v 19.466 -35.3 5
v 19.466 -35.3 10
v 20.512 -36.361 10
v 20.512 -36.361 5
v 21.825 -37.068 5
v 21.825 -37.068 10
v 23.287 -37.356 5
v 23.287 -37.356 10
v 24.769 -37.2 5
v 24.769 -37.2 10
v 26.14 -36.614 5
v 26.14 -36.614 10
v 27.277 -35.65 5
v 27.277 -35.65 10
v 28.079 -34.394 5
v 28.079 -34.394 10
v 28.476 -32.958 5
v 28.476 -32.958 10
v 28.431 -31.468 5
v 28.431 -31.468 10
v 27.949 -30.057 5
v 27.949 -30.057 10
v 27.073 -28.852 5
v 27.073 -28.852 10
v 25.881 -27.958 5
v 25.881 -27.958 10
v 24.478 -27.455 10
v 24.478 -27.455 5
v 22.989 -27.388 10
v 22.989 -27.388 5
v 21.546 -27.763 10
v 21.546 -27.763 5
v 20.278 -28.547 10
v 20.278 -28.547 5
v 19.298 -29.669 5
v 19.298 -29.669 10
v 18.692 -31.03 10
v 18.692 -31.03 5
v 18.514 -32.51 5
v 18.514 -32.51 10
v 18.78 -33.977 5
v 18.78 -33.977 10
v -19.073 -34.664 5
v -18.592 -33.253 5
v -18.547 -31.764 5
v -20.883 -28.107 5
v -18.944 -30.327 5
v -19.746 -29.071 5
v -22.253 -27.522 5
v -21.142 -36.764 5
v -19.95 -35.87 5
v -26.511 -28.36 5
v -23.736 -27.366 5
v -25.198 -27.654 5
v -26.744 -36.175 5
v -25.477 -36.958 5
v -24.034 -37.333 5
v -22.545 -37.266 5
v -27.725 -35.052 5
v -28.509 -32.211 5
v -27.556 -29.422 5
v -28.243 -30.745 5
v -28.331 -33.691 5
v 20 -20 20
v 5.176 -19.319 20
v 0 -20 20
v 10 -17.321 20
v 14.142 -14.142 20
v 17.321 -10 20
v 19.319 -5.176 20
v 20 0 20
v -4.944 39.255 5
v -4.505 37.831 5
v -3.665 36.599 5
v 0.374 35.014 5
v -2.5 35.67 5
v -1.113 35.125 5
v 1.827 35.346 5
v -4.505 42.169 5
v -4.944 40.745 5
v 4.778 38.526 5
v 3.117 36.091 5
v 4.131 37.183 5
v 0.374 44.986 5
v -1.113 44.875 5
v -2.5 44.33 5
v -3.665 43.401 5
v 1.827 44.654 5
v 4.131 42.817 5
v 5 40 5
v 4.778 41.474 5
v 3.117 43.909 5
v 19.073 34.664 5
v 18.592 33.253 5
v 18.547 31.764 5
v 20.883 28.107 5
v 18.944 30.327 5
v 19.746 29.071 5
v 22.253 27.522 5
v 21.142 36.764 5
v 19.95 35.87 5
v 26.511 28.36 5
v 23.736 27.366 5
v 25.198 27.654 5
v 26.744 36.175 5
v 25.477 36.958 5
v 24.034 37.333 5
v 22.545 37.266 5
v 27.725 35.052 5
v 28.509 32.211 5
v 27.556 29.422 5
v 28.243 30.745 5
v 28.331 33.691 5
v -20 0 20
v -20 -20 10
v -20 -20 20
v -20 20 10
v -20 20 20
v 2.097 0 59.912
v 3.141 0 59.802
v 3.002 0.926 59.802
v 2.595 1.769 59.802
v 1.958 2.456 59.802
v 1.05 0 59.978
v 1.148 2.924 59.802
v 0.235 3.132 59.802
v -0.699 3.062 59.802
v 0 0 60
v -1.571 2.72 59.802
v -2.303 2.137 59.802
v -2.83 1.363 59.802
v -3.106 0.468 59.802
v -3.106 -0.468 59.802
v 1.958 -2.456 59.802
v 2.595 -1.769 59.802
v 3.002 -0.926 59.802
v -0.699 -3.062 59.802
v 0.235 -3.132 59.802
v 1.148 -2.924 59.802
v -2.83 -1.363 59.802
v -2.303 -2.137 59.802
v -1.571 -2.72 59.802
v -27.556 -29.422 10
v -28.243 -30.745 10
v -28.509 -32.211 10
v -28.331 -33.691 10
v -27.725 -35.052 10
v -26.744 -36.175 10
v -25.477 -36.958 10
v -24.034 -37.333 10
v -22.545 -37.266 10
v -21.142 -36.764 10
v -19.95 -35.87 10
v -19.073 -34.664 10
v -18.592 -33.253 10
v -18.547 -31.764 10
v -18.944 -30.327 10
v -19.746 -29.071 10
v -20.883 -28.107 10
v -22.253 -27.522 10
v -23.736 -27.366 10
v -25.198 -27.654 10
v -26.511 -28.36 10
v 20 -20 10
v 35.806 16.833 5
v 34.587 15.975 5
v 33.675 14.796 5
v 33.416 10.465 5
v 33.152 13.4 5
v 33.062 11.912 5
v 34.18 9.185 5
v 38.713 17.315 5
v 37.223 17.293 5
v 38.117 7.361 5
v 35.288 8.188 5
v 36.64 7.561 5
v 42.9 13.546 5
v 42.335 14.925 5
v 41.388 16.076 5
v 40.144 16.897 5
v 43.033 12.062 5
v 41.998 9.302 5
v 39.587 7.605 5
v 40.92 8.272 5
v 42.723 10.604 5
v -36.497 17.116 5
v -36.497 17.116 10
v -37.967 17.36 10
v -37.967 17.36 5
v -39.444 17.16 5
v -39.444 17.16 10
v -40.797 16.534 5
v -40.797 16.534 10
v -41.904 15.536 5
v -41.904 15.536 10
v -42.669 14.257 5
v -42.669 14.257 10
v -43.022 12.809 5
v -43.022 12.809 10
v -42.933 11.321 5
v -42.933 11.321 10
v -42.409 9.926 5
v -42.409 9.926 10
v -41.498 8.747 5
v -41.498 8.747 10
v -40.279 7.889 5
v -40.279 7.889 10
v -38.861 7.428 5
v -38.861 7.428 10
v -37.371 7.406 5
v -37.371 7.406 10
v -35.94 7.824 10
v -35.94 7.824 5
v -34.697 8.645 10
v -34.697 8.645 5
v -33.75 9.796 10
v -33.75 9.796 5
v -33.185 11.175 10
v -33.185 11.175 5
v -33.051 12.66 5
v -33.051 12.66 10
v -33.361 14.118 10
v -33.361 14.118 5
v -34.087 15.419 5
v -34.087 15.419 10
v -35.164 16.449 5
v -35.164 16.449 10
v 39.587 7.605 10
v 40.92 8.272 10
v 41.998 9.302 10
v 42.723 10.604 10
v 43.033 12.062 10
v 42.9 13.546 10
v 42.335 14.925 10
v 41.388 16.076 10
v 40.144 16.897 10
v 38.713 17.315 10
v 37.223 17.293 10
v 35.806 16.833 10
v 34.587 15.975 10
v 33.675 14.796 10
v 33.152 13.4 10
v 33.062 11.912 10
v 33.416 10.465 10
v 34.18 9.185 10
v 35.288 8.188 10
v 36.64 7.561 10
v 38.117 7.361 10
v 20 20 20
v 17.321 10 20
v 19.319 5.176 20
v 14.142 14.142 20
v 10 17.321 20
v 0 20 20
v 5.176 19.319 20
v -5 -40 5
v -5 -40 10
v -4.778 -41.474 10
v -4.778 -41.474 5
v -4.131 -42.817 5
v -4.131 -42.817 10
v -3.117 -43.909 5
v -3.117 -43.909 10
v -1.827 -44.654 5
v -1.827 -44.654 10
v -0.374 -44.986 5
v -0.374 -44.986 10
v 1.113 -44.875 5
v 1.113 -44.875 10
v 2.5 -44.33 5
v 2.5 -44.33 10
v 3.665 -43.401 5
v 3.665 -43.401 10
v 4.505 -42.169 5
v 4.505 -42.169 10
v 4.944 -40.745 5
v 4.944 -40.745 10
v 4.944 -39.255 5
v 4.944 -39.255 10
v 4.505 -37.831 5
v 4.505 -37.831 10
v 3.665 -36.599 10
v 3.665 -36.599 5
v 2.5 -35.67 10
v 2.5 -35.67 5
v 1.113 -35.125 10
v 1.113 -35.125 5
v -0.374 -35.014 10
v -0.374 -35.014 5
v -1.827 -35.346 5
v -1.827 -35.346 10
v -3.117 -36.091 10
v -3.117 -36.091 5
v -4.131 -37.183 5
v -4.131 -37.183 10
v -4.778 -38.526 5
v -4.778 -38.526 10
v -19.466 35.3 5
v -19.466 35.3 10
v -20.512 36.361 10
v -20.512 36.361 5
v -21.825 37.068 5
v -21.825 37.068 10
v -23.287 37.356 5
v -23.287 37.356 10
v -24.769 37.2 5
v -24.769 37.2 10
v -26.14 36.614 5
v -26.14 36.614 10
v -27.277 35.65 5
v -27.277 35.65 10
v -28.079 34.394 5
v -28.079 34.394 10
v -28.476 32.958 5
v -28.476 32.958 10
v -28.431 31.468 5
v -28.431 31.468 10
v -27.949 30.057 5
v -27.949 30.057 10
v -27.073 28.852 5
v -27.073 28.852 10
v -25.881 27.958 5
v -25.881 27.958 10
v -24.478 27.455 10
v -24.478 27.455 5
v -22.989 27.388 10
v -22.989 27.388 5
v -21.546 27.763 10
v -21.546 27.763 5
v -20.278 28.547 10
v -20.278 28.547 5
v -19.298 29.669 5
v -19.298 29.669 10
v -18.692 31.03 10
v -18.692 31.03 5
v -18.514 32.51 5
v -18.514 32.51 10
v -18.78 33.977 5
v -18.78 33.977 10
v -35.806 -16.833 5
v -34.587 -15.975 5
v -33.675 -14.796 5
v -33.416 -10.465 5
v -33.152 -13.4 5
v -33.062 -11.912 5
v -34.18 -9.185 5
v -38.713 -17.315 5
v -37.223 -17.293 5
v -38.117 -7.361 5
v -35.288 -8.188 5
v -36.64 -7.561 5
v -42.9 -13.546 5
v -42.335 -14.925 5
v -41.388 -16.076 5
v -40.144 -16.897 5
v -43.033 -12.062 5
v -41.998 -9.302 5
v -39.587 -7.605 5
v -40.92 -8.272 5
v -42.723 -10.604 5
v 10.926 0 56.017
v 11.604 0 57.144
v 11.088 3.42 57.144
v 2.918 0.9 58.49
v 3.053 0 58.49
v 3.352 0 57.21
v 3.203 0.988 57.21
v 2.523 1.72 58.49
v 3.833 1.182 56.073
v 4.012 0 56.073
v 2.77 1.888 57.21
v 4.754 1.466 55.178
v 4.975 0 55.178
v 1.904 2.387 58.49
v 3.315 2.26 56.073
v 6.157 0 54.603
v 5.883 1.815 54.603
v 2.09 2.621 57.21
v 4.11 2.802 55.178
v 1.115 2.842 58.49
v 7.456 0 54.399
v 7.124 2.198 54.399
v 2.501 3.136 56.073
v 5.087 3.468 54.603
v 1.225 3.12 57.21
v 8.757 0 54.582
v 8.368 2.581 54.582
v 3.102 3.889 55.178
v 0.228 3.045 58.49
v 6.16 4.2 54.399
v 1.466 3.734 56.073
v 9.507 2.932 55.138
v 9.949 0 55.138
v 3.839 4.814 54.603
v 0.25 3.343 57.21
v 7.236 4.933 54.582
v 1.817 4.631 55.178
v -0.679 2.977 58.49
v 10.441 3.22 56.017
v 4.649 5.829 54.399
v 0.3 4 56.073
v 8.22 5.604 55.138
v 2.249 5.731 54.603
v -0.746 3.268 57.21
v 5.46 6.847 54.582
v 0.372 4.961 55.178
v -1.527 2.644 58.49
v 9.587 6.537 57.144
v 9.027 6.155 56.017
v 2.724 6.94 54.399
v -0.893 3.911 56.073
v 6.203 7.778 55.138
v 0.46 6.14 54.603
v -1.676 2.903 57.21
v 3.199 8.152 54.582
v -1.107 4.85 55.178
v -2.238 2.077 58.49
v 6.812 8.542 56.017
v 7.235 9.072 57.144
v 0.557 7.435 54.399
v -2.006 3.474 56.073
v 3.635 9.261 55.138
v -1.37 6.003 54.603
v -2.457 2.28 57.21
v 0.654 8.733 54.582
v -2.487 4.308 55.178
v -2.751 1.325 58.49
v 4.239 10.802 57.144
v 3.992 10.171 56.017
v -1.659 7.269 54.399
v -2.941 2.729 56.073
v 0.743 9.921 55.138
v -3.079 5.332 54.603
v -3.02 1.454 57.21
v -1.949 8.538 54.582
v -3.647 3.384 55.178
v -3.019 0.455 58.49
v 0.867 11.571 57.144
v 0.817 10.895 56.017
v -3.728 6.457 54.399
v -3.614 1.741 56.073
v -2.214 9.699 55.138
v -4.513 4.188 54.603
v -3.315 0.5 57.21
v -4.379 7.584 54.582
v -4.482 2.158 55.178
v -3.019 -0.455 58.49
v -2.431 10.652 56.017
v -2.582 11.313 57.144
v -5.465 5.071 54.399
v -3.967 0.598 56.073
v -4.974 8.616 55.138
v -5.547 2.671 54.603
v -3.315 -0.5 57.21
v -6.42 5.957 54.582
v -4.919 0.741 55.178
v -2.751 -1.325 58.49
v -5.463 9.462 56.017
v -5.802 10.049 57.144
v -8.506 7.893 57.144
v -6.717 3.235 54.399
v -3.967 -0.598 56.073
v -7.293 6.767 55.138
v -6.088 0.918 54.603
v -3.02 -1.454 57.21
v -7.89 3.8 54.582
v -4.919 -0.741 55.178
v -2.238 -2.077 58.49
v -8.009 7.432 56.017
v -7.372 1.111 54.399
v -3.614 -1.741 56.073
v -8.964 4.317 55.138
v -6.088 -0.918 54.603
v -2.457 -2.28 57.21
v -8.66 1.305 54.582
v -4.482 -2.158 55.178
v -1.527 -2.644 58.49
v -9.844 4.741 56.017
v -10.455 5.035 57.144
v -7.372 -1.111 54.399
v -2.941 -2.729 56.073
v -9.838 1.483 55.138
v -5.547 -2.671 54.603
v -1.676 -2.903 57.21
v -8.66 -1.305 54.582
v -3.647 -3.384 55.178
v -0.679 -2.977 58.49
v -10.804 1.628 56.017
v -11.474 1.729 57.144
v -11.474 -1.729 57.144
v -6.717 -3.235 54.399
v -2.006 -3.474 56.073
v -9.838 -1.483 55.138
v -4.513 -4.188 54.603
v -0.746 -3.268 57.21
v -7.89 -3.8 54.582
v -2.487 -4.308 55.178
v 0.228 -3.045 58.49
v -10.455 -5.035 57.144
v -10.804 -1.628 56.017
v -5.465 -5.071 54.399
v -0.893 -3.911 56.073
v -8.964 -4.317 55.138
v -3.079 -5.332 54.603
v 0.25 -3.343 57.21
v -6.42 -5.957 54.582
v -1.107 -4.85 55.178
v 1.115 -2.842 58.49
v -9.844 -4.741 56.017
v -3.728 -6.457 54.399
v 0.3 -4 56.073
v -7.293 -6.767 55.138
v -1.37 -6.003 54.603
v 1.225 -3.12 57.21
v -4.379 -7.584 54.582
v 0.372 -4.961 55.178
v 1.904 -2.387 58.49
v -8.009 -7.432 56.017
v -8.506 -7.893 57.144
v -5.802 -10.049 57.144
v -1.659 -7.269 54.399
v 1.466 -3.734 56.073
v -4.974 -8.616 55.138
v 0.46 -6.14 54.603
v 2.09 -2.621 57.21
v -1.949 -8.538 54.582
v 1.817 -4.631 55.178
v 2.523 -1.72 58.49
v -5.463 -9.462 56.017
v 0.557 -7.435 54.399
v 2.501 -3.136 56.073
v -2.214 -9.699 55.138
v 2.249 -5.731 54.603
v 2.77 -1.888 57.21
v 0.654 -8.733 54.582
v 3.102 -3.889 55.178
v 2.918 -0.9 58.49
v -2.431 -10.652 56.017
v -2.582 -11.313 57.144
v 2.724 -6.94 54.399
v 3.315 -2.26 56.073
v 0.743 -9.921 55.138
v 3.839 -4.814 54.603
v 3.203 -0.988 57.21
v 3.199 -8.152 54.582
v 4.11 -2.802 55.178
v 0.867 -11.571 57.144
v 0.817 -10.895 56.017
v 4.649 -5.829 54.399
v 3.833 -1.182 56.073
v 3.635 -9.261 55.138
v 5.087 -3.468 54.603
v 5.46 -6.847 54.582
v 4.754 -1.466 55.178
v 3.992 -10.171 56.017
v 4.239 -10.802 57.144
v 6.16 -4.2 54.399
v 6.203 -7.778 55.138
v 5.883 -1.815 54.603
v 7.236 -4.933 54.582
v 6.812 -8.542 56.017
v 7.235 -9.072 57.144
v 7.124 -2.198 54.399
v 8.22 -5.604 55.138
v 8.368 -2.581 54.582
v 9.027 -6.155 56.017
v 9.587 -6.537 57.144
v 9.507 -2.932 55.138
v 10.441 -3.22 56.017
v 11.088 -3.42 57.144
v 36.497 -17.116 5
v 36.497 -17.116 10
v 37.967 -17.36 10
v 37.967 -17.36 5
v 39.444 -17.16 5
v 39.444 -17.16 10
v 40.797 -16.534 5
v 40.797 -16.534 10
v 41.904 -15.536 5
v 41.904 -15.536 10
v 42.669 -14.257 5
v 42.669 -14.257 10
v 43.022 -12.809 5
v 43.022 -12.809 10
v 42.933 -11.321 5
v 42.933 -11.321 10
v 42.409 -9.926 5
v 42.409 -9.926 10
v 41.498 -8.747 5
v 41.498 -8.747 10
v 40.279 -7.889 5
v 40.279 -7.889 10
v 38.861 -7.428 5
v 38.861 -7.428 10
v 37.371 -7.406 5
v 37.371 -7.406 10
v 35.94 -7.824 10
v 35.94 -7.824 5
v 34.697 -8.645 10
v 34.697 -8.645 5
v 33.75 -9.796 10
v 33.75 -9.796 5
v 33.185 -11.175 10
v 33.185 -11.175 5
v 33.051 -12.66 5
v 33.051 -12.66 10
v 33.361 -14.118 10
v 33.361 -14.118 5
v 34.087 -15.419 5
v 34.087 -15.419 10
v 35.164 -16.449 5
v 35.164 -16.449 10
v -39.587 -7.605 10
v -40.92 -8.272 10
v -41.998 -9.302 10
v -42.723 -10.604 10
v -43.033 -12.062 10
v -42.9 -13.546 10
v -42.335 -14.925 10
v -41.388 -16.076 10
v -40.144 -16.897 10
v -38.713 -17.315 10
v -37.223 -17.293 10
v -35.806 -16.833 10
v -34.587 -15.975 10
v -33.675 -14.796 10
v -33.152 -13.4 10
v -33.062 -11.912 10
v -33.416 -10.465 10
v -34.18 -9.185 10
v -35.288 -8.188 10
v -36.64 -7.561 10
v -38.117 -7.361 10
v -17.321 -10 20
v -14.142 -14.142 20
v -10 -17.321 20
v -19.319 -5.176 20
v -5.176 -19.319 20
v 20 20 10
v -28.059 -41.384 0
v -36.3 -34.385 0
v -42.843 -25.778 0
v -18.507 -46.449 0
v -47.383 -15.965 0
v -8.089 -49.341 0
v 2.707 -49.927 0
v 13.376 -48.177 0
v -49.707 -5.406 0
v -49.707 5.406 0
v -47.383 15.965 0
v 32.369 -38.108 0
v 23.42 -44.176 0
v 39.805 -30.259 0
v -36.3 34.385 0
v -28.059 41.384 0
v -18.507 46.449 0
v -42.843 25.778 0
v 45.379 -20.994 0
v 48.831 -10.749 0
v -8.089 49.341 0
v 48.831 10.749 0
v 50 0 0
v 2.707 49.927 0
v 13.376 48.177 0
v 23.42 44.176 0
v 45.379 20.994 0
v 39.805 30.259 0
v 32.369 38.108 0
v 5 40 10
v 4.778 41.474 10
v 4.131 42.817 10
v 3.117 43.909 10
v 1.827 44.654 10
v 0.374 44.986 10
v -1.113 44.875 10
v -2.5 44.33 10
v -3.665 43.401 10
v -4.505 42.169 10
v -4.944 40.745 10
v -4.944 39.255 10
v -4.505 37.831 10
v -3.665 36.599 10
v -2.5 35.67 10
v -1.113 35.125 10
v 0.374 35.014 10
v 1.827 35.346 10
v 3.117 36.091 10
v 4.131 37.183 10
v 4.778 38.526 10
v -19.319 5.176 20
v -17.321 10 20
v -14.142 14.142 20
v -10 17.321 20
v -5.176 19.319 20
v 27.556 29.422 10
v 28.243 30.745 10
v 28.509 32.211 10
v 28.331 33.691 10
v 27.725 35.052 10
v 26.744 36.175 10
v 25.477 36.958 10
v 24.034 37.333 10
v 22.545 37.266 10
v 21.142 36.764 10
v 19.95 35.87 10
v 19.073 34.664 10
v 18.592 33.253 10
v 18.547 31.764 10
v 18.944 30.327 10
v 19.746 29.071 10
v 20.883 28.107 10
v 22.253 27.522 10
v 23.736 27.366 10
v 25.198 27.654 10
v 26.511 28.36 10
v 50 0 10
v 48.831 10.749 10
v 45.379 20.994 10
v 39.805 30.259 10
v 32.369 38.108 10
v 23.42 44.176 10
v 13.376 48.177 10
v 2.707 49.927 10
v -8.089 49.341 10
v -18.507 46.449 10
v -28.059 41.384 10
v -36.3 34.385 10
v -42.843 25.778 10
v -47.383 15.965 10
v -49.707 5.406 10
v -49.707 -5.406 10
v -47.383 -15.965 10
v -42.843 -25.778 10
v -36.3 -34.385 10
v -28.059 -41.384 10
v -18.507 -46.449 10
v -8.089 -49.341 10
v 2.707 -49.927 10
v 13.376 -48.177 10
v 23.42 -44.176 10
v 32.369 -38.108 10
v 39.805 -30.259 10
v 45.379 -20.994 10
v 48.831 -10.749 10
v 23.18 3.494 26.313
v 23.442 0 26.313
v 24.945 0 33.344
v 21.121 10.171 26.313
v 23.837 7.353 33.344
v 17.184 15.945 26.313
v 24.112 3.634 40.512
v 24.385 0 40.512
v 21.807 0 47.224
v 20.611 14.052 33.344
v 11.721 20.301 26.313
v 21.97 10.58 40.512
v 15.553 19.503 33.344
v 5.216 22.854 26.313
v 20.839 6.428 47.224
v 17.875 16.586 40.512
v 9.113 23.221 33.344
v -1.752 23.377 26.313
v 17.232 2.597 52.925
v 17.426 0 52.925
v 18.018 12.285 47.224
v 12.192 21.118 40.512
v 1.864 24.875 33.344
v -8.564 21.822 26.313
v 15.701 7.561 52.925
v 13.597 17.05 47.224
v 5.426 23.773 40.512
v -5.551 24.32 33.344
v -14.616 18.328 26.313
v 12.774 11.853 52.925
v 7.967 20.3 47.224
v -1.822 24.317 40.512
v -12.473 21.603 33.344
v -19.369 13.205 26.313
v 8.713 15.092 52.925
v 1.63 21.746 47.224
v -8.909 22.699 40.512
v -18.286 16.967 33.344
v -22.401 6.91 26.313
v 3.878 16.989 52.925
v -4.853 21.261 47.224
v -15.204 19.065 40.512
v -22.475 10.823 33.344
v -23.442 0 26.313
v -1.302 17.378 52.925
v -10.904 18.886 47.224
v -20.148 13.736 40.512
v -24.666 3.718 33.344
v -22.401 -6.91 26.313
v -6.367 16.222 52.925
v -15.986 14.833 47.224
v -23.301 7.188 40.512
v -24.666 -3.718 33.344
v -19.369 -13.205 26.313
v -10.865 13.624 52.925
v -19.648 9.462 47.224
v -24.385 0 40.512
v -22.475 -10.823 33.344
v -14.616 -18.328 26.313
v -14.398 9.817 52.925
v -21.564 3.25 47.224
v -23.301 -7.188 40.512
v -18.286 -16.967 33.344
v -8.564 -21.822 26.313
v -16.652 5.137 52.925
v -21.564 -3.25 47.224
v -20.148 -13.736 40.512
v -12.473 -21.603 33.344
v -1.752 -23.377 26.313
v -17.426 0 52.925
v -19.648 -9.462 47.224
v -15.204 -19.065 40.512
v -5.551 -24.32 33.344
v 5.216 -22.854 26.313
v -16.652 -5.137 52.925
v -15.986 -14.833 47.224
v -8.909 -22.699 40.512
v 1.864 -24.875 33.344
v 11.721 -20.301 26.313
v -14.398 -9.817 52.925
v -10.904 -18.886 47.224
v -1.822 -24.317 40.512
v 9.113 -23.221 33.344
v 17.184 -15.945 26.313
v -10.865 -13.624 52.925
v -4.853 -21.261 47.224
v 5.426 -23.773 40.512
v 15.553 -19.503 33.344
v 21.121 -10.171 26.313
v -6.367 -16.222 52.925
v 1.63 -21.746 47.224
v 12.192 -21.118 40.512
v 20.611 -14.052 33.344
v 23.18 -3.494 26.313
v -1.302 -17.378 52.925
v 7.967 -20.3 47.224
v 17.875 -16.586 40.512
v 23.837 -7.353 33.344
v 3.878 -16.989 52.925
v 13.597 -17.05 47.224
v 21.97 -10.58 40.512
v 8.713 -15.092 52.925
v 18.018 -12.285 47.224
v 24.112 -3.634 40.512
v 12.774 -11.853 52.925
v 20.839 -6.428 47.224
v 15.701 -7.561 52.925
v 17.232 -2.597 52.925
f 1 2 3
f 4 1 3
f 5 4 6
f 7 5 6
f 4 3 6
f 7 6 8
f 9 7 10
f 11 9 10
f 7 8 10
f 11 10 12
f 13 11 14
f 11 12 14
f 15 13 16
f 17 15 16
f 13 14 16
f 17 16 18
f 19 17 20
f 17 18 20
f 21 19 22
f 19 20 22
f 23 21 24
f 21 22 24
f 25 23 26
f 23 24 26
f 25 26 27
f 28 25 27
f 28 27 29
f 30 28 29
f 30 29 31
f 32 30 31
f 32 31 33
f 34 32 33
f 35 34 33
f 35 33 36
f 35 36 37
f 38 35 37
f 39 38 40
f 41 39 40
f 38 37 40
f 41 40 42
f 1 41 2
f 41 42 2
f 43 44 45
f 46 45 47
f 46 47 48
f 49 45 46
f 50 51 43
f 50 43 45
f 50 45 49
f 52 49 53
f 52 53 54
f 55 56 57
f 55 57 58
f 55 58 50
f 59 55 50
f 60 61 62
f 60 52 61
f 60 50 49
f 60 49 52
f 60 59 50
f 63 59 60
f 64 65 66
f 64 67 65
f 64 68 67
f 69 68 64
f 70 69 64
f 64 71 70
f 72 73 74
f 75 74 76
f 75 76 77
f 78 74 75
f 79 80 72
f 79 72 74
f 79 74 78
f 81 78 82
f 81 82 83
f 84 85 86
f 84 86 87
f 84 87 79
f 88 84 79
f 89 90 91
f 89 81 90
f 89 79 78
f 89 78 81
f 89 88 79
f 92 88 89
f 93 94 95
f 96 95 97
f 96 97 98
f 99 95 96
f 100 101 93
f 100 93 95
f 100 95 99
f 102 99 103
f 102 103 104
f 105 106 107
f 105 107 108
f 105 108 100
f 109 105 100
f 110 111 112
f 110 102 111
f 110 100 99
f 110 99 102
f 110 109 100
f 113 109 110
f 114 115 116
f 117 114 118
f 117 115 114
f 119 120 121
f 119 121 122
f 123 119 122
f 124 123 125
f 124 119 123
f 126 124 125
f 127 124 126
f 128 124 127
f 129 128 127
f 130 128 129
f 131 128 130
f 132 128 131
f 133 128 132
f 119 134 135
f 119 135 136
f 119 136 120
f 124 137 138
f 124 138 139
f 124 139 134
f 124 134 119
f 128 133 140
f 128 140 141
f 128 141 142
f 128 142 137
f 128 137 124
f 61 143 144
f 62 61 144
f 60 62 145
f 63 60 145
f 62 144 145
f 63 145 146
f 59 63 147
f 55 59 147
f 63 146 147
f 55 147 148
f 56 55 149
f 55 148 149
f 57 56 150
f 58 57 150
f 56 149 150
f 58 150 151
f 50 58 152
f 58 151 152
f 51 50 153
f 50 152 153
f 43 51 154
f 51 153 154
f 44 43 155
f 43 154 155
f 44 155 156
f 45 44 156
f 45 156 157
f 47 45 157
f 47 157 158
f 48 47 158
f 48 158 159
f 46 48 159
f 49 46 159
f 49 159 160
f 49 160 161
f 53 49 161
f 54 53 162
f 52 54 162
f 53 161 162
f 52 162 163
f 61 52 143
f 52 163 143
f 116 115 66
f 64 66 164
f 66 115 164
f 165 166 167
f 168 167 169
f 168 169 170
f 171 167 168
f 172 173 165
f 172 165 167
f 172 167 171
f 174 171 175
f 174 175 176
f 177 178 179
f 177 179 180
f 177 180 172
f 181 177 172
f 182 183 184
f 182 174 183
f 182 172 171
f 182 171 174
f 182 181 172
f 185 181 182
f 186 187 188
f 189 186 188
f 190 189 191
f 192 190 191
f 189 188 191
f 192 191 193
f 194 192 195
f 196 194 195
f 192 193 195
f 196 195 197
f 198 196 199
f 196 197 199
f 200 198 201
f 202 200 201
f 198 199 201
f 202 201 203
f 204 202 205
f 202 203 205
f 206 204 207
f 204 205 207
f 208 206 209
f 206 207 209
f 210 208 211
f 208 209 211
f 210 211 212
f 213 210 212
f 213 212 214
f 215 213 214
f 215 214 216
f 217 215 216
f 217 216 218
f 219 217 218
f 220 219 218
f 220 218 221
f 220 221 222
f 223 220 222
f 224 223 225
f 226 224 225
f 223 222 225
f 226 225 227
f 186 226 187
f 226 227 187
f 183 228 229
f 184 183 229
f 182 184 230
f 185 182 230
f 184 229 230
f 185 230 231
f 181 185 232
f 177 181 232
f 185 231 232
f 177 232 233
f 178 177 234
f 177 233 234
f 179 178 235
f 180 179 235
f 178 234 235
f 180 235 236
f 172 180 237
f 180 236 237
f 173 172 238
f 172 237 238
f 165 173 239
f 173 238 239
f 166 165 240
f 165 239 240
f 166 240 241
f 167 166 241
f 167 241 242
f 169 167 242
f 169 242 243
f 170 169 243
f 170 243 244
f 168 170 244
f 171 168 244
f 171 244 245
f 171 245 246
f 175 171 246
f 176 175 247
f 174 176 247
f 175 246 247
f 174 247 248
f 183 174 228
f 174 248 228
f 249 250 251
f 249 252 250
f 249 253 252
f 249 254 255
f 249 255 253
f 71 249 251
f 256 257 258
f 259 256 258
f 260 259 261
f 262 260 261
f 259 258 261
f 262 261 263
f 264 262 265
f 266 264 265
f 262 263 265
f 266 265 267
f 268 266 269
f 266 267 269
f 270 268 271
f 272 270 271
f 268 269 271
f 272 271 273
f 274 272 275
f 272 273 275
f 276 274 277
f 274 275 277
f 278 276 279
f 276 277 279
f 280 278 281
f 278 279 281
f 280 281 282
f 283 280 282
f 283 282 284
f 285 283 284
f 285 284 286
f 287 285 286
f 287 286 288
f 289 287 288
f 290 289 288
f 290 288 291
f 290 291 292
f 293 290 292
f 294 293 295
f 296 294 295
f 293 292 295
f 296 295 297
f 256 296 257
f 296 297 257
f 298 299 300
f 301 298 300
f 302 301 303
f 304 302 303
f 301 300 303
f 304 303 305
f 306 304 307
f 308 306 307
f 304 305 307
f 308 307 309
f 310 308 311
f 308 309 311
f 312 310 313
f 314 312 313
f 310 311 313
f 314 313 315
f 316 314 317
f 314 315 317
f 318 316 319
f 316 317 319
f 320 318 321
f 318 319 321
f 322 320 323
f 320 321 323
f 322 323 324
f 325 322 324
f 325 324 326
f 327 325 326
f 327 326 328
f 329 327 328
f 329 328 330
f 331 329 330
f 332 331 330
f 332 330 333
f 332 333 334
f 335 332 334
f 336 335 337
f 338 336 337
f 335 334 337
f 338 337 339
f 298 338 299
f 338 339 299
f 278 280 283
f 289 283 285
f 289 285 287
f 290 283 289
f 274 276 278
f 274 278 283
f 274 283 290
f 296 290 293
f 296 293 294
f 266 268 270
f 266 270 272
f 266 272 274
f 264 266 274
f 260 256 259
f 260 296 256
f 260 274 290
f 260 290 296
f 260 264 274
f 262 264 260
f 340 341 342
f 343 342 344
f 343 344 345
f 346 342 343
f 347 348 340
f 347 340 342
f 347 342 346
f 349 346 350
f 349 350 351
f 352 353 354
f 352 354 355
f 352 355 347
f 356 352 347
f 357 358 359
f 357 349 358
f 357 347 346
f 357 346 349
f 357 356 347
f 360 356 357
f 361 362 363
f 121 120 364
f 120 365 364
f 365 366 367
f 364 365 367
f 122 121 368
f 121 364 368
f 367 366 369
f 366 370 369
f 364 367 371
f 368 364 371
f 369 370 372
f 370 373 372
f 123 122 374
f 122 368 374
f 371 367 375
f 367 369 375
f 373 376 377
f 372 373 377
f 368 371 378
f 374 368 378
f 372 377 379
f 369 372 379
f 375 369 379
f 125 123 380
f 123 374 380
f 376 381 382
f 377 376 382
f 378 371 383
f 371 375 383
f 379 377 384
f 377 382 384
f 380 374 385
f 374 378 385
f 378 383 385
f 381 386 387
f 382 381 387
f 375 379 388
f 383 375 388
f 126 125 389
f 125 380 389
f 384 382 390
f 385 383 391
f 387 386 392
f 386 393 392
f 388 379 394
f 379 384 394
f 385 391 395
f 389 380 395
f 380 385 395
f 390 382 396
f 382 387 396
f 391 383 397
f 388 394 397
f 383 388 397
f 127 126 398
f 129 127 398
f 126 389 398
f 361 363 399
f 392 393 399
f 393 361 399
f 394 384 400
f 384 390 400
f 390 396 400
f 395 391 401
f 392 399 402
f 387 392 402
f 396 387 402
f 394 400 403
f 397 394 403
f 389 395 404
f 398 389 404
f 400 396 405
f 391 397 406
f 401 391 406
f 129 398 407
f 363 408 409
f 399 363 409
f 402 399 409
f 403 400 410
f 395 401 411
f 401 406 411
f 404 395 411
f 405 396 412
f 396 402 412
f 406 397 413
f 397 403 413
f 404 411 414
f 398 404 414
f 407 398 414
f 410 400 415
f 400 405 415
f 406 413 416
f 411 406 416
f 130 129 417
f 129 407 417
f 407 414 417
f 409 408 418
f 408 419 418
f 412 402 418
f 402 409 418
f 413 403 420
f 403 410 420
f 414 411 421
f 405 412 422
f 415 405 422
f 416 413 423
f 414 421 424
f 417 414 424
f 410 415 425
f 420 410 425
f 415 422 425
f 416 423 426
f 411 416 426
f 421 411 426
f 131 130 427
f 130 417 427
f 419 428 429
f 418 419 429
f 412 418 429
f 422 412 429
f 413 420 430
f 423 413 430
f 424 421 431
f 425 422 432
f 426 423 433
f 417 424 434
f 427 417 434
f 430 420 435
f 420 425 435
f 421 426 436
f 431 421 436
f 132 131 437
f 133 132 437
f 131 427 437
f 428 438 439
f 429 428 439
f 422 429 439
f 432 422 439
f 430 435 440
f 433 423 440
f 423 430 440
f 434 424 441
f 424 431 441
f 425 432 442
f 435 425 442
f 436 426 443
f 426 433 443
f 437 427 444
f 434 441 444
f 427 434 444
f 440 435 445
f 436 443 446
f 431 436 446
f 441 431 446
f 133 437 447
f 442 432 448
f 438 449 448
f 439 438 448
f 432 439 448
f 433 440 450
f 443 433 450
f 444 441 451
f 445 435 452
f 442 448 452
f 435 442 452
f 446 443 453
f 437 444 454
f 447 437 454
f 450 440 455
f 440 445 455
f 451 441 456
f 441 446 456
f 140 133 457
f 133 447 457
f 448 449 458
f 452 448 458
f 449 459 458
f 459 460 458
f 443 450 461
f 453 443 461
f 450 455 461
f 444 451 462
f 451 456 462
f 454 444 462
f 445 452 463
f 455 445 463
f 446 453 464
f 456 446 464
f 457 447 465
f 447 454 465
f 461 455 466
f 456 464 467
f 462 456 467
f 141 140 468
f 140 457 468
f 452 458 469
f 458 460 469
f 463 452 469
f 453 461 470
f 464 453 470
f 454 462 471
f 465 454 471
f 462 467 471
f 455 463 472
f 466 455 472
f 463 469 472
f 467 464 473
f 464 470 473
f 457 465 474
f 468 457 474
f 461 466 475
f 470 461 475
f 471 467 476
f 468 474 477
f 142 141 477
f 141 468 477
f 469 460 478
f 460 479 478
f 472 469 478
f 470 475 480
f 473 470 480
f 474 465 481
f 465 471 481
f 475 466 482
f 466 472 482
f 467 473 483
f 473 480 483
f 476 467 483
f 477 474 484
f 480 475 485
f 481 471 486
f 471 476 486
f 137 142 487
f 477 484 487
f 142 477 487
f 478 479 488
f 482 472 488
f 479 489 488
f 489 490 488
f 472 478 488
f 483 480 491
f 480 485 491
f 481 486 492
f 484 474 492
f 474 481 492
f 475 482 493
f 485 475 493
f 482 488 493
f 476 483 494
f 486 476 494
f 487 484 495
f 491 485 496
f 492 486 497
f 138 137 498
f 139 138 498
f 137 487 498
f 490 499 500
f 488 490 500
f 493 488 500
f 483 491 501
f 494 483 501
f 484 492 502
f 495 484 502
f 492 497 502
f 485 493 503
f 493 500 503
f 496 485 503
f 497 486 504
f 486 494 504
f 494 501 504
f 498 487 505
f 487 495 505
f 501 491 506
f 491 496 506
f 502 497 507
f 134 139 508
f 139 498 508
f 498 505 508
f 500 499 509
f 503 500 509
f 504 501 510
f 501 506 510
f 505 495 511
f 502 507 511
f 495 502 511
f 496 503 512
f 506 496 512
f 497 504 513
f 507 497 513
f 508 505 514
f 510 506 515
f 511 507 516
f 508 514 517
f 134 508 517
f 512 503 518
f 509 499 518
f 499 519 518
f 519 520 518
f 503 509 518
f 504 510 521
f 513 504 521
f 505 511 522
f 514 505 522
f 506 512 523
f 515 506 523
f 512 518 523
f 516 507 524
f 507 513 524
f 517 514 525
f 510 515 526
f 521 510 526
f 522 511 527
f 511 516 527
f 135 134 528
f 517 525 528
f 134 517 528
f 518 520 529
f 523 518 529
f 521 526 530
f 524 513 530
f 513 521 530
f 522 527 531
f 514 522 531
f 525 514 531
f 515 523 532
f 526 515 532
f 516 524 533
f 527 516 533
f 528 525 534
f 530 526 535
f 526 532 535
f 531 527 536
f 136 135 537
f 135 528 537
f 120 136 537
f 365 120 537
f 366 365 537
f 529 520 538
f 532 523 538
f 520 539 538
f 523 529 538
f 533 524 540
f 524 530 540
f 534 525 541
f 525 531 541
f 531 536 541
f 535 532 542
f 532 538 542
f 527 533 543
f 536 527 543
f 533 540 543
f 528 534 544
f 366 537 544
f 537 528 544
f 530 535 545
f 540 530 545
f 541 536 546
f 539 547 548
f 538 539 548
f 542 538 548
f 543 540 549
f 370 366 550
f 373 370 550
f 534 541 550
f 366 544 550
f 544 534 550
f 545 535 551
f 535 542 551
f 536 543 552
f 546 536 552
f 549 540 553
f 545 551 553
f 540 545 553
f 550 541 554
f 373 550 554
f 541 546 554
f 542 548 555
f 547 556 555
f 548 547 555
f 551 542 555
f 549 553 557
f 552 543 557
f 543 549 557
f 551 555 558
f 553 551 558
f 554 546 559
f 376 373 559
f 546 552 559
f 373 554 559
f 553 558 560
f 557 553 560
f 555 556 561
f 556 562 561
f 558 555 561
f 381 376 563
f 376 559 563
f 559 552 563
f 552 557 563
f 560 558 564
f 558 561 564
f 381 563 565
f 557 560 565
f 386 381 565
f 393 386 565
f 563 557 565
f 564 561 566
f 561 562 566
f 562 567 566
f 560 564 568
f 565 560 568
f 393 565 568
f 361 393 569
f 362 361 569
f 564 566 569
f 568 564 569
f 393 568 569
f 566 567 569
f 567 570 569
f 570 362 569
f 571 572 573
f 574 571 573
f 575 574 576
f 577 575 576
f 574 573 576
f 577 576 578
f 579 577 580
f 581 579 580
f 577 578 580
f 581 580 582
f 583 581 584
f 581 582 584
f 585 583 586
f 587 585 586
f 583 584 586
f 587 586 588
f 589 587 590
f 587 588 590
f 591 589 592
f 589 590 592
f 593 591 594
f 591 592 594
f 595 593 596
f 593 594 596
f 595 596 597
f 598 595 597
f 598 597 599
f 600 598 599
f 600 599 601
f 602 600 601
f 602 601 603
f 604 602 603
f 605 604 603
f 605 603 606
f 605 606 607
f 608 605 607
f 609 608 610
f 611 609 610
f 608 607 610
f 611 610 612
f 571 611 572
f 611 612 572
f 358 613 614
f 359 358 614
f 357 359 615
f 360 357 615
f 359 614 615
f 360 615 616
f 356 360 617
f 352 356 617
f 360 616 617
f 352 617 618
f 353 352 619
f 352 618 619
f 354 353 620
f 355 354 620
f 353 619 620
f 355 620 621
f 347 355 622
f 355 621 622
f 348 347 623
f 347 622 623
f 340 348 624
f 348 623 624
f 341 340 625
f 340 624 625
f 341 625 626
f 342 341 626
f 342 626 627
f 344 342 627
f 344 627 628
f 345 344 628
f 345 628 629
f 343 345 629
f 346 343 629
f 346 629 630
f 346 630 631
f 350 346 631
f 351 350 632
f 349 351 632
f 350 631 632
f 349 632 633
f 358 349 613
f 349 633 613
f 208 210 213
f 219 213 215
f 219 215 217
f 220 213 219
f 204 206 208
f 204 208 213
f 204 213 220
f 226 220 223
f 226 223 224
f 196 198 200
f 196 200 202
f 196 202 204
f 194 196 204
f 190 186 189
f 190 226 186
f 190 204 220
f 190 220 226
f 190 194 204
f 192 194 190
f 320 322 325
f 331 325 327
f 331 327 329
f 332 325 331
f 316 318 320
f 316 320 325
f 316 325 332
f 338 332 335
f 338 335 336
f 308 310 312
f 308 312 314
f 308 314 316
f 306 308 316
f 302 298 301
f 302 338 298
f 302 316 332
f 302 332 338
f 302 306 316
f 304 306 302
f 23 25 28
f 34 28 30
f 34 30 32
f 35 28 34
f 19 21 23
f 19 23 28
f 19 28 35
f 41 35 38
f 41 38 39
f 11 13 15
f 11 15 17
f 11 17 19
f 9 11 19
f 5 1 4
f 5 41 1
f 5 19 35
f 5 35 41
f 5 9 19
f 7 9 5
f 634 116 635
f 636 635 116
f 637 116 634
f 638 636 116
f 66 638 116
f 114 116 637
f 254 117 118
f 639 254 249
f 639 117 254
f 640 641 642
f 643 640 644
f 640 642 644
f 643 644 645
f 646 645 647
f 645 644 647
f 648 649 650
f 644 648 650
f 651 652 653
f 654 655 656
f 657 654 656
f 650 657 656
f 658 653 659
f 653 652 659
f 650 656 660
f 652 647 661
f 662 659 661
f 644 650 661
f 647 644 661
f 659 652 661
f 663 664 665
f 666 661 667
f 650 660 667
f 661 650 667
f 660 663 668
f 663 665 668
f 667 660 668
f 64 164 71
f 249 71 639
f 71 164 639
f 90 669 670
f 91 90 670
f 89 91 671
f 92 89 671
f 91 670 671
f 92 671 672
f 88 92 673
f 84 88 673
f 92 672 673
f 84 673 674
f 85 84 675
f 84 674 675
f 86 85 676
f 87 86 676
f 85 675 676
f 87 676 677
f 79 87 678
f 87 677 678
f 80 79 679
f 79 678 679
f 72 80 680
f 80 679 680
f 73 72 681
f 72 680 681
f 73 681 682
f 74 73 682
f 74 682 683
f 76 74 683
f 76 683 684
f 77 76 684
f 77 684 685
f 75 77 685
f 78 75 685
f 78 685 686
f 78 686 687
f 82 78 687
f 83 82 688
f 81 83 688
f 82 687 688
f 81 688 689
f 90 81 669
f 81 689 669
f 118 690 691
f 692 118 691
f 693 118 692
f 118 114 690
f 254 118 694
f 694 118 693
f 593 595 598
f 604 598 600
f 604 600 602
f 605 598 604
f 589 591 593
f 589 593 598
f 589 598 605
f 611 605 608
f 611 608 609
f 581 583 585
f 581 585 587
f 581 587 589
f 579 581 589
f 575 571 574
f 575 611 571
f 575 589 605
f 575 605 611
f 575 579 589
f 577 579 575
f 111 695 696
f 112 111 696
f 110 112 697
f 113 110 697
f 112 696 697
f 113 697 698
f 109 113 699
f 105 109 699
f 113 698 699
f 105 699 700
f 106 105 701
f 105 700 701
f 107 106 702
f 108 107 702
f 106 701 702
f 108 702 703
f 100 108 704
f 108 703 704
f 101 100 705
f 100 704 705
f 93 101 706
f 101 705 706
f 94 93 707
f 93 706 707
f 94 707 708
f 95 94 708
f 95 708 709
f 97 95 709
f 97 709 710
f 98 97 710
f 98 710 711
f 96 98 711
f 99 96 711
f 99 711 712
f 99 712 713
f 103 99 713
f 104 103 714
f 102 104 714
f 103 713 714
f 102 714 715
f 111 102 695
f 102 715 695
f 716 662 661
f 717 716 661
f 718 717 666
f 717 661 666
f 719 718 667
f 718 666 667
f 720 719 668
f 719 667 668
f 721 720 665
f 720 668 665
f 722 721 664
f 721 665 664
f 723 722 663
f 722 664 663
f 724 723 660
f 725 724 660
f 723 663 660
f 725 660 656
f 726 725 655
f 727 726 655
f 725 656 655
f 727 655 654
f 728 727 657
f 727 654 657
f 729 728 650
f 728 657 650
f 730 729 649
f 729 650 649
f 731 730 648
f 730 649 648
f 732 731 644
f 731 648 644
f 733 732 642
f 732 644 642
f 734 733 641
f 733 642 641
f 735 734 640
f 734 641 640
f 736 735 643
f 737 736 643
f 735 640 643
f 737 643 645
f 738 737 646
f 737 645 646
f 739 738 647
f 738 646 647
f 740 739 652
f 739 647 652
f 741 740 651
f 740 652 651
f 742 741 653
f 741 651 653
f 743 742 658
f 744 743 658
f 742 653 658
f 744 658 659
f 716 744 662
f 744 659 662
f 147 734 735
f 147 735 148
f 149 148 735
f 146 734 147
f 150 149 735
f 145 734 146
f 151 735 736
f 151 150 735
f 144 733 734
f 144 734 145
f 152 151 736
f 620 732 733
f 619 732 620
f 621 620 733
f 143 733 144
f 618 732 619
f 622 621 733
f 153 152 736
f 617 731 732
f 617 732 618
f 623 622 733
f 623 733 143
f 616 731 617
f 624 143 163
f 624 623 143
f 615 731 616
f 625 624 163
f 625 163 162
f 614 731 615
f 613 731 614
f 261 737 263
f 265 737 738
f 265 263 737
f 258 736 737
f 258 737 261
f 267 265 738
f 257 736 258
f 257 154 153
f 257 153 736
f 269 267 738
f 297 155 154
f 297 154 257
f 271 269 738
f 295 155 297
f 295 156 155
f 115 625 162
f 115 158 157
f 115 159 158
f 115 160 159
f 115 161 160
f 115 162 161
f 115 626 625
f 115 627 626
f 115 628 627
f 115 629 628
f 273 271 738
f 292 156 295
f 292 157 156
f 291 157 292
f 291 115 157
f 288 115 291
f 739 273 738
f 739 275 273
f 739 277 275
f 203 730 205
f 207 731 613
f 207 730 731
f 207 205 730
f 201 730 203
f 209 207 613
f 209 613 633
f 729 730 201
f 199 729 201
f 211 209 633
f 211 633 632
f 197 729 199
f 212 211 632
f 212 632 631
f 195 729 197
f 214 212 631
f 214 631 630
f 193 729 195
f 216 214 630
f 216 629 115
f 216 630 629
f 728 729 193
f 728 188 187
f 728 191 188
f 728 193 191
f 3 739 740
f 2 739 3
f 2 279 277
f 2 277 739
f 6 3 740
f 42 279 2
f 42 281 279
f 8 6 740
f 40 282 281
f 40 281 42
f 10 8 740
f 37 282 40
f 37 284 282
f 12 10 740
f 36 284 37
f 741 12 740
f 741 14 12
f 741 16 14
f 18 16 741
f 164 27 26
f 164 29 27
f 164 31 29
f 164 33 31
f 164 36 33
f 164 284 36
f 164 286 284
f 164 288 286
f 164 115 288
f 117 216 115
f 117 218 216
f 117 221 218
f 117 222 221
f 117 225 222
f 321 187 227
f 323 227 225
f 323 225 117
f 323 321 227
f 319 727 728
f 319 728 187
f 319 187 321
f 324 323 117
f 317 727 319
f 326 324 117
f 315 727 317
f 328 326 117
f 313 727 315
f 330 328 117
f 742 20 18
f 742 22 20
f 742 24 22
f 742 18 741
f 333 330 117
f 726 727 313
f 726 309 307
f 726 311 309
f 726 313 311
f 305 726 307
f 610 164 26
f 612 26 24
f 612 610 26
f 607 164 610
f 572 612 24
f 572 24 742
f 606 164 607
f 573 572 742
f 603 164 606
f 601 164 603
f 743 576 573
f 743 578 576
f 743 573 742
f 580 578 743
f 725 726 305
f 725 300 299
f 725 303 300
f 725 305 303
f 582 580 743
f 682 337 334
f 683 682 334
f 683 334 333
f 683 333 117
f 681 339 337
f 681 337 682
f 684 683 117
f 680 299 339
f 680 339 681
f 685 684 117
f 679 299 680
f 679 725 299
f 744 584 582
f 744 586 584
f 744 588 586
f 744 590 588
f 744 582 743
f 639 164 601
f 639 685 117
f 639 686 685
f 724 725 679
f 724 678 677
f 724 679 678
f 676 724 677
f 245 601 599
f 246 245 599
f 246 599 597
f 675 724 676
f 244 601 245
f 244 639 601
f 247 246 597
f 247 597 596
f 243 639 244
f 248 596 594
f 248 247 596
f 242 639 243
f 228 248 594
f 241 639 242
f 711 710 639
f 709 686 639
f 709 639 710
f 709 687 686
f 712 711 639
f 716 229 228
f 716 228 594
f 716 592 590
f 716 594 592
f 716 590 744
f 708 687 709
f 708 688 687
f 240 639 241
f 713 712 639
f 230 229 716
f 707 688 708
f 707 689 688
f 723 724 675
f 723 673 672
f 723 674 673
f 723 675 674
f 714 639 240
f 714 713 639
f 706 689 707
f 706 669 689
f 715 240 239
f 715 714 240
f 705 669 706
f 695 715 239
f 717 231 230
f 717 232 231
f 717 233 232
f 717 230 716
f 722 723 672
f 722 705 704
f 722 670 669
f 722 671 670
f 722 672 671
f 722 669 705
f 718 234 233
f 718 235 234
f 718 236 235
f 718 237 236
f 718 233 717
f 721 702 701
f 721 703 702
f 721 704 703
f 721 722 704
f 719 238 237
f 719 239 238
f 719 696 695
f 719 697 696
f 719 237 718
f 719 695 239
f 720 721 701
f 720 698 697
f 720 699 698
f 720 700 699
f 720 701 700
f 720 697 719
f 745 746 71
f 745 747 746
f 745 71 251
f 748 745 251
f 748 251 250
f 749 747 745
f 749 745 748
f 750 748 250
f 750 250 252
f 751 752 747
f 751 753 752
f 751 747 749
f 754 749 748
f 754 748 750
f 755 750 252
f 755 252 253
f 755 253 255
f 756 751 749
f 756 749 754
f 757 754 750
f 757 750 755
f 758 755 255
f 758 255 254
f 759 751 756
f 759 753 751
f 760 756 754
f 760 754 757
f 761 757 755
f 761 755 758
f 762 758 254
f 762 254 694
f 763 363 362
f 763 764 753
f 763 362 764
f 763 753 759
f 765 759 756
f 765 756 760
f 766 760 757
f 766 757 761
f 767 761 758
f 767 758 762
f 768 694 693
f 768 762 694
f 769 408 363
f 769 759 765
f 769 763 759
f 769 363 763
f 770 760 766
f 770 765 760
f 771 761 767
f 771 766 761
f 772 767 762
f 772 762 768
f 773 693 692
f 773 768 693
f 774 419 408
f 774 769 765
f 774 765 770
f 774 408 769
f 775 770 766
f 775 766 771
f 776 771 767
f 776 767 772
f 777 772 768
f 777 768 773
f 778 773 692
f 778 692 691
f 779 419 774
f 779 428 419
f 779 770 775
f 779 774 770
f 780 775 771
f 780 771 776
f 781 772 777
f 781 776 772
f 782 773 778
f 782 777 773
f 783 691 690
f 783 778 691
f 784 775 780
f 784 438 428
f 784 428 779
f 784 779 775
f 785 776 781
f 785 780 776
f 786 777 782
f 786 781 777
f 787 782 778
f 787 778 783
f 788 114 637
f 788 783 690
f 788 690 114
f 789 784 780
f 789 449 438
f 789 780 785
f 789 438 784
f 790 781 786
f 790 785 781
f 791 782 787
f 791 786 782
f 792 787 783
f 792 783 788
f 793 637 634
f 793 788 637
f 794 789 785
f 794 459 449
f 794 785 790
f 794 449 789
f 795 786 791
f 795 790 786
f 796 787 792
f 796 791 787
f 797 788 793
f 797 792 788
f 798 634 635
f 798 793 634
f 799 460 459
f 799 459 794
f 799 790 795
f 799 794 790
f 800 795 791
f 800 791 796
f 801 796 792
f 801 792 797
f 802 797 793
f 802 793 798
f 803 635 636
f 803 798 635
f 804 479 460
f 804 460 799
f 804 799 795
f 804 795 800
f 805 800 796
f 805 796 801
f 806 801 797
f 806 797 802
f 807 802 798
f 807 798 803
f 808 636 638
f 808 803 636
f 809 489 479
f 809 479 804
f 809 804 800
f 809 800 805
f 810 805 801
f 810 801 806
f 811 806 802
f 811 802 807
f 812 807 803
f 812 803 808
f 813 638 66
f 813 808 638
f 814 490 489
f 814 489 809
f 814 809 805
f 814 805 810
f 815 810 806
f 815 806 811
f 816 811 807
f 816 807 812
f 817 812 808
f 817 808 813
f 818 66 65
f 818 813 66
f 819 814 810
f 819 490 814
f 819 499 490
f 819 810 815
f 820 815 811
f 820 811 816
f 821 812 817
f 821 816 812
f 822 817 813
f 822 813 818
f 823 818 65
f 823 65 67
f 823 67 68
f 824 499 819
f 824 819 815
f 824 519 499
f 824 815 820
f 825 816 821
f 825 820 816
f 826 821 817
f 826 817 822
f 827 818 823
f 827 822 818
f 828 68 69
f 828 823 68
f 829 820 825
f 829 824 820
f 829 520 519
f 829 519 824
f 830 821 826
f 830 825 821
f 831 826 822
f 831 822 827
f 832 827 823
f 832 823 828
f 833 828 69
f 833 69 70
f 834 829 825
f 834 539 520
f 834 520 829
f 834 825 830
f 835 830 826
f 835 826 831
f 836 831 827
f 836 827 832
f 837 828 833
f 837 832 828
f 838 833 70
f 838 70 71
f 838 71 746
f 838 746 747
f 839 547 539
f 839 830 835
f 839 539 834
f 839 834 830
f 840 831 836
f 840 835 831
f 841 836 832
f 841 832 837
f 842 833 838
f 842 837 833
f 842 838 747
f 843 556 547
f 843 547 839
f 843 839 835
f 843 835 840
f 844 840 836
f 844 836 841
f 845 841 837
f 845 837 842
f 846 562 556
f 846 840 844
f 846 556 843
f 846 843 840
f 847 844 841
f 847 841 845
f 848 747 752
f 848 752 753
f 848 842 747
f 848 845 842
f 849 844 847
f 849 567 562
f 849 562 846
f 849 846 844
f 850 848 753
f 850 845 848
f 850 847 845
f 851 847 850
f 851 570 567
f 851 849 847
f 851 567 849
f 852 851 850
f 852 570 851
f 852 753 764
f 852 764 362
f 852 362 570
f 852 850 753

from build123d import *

# Parameters (mm, degrees)
SKETCH_R           = 50
PAD_DEPTH          = 10
SKETCH001_R        = 5
POCKET_DEPTH       = 5
POLARPATTERN_COUNT = 10
SKETCH002_W        = 40
SKETCH002_H        = 40
PAD001_DEPTH       = 10
SKETCH004_R        = 4.452809


with BuildPart() as part:
    # Sketch → Pad (new body)
    with BuildSketch(Plane.XY):
        Circle(SKETCH_R)
    extrude(amount=PAD_DEPTH)

    # Sketch001 (on Face3 of Pad) → Pocket (cut)
    with BuildSketch(Plane.XY.offset(10)):
        with Locations((0, 40)):
            Circle(SKETCH001_R)
    pocket = extrude(amount=-POCKET_DEPTH, mode=Mode.SUBTRACT)

    # PolarPattern: Pocket ×10 about axis
    polarpattern_axis = Axis((0, 0, 0), (0, 0, 1))
    for i in range(1, POLARPATTERN_COUNT):
        add(pocket.rotate(polarpattern_axis, i * 360 / POLARPATTERN_COUNT), mode=Mode.SUBTRACT)

    # Sketch002 (on Face3 of PolarPattern) → Pad001 (join)
    with BuildSketch(Plane.XY.offset(10)):
        Rectangle(SKETCH002_W, SKETCH002_H)
    extrude(amount=PAD001_DEPTH)

    # Sketch003 → Revolution (revolve)
    with BuildSketch(Plane.XZ):
        with BuildLine():
            ThreePointArc((0, 10), (25, 35), (0, 60))
            Line((0, 60), (0, 10))
        make_face()
    revolve(axis=Axis((0, 0, 0), (0, 0, 1)))

    # Sketch004 → Groove (revolve, cut)
    with BuildSketch(Plane.XZ):
        with Locations((7.491299, 58.851215)):
            Circle(SKETCH004_R)
    revolve(axis=Axis((0, 0, 0), (0, 0, 1)), mode=Mode.SUBTRACT)


solid = part.part
